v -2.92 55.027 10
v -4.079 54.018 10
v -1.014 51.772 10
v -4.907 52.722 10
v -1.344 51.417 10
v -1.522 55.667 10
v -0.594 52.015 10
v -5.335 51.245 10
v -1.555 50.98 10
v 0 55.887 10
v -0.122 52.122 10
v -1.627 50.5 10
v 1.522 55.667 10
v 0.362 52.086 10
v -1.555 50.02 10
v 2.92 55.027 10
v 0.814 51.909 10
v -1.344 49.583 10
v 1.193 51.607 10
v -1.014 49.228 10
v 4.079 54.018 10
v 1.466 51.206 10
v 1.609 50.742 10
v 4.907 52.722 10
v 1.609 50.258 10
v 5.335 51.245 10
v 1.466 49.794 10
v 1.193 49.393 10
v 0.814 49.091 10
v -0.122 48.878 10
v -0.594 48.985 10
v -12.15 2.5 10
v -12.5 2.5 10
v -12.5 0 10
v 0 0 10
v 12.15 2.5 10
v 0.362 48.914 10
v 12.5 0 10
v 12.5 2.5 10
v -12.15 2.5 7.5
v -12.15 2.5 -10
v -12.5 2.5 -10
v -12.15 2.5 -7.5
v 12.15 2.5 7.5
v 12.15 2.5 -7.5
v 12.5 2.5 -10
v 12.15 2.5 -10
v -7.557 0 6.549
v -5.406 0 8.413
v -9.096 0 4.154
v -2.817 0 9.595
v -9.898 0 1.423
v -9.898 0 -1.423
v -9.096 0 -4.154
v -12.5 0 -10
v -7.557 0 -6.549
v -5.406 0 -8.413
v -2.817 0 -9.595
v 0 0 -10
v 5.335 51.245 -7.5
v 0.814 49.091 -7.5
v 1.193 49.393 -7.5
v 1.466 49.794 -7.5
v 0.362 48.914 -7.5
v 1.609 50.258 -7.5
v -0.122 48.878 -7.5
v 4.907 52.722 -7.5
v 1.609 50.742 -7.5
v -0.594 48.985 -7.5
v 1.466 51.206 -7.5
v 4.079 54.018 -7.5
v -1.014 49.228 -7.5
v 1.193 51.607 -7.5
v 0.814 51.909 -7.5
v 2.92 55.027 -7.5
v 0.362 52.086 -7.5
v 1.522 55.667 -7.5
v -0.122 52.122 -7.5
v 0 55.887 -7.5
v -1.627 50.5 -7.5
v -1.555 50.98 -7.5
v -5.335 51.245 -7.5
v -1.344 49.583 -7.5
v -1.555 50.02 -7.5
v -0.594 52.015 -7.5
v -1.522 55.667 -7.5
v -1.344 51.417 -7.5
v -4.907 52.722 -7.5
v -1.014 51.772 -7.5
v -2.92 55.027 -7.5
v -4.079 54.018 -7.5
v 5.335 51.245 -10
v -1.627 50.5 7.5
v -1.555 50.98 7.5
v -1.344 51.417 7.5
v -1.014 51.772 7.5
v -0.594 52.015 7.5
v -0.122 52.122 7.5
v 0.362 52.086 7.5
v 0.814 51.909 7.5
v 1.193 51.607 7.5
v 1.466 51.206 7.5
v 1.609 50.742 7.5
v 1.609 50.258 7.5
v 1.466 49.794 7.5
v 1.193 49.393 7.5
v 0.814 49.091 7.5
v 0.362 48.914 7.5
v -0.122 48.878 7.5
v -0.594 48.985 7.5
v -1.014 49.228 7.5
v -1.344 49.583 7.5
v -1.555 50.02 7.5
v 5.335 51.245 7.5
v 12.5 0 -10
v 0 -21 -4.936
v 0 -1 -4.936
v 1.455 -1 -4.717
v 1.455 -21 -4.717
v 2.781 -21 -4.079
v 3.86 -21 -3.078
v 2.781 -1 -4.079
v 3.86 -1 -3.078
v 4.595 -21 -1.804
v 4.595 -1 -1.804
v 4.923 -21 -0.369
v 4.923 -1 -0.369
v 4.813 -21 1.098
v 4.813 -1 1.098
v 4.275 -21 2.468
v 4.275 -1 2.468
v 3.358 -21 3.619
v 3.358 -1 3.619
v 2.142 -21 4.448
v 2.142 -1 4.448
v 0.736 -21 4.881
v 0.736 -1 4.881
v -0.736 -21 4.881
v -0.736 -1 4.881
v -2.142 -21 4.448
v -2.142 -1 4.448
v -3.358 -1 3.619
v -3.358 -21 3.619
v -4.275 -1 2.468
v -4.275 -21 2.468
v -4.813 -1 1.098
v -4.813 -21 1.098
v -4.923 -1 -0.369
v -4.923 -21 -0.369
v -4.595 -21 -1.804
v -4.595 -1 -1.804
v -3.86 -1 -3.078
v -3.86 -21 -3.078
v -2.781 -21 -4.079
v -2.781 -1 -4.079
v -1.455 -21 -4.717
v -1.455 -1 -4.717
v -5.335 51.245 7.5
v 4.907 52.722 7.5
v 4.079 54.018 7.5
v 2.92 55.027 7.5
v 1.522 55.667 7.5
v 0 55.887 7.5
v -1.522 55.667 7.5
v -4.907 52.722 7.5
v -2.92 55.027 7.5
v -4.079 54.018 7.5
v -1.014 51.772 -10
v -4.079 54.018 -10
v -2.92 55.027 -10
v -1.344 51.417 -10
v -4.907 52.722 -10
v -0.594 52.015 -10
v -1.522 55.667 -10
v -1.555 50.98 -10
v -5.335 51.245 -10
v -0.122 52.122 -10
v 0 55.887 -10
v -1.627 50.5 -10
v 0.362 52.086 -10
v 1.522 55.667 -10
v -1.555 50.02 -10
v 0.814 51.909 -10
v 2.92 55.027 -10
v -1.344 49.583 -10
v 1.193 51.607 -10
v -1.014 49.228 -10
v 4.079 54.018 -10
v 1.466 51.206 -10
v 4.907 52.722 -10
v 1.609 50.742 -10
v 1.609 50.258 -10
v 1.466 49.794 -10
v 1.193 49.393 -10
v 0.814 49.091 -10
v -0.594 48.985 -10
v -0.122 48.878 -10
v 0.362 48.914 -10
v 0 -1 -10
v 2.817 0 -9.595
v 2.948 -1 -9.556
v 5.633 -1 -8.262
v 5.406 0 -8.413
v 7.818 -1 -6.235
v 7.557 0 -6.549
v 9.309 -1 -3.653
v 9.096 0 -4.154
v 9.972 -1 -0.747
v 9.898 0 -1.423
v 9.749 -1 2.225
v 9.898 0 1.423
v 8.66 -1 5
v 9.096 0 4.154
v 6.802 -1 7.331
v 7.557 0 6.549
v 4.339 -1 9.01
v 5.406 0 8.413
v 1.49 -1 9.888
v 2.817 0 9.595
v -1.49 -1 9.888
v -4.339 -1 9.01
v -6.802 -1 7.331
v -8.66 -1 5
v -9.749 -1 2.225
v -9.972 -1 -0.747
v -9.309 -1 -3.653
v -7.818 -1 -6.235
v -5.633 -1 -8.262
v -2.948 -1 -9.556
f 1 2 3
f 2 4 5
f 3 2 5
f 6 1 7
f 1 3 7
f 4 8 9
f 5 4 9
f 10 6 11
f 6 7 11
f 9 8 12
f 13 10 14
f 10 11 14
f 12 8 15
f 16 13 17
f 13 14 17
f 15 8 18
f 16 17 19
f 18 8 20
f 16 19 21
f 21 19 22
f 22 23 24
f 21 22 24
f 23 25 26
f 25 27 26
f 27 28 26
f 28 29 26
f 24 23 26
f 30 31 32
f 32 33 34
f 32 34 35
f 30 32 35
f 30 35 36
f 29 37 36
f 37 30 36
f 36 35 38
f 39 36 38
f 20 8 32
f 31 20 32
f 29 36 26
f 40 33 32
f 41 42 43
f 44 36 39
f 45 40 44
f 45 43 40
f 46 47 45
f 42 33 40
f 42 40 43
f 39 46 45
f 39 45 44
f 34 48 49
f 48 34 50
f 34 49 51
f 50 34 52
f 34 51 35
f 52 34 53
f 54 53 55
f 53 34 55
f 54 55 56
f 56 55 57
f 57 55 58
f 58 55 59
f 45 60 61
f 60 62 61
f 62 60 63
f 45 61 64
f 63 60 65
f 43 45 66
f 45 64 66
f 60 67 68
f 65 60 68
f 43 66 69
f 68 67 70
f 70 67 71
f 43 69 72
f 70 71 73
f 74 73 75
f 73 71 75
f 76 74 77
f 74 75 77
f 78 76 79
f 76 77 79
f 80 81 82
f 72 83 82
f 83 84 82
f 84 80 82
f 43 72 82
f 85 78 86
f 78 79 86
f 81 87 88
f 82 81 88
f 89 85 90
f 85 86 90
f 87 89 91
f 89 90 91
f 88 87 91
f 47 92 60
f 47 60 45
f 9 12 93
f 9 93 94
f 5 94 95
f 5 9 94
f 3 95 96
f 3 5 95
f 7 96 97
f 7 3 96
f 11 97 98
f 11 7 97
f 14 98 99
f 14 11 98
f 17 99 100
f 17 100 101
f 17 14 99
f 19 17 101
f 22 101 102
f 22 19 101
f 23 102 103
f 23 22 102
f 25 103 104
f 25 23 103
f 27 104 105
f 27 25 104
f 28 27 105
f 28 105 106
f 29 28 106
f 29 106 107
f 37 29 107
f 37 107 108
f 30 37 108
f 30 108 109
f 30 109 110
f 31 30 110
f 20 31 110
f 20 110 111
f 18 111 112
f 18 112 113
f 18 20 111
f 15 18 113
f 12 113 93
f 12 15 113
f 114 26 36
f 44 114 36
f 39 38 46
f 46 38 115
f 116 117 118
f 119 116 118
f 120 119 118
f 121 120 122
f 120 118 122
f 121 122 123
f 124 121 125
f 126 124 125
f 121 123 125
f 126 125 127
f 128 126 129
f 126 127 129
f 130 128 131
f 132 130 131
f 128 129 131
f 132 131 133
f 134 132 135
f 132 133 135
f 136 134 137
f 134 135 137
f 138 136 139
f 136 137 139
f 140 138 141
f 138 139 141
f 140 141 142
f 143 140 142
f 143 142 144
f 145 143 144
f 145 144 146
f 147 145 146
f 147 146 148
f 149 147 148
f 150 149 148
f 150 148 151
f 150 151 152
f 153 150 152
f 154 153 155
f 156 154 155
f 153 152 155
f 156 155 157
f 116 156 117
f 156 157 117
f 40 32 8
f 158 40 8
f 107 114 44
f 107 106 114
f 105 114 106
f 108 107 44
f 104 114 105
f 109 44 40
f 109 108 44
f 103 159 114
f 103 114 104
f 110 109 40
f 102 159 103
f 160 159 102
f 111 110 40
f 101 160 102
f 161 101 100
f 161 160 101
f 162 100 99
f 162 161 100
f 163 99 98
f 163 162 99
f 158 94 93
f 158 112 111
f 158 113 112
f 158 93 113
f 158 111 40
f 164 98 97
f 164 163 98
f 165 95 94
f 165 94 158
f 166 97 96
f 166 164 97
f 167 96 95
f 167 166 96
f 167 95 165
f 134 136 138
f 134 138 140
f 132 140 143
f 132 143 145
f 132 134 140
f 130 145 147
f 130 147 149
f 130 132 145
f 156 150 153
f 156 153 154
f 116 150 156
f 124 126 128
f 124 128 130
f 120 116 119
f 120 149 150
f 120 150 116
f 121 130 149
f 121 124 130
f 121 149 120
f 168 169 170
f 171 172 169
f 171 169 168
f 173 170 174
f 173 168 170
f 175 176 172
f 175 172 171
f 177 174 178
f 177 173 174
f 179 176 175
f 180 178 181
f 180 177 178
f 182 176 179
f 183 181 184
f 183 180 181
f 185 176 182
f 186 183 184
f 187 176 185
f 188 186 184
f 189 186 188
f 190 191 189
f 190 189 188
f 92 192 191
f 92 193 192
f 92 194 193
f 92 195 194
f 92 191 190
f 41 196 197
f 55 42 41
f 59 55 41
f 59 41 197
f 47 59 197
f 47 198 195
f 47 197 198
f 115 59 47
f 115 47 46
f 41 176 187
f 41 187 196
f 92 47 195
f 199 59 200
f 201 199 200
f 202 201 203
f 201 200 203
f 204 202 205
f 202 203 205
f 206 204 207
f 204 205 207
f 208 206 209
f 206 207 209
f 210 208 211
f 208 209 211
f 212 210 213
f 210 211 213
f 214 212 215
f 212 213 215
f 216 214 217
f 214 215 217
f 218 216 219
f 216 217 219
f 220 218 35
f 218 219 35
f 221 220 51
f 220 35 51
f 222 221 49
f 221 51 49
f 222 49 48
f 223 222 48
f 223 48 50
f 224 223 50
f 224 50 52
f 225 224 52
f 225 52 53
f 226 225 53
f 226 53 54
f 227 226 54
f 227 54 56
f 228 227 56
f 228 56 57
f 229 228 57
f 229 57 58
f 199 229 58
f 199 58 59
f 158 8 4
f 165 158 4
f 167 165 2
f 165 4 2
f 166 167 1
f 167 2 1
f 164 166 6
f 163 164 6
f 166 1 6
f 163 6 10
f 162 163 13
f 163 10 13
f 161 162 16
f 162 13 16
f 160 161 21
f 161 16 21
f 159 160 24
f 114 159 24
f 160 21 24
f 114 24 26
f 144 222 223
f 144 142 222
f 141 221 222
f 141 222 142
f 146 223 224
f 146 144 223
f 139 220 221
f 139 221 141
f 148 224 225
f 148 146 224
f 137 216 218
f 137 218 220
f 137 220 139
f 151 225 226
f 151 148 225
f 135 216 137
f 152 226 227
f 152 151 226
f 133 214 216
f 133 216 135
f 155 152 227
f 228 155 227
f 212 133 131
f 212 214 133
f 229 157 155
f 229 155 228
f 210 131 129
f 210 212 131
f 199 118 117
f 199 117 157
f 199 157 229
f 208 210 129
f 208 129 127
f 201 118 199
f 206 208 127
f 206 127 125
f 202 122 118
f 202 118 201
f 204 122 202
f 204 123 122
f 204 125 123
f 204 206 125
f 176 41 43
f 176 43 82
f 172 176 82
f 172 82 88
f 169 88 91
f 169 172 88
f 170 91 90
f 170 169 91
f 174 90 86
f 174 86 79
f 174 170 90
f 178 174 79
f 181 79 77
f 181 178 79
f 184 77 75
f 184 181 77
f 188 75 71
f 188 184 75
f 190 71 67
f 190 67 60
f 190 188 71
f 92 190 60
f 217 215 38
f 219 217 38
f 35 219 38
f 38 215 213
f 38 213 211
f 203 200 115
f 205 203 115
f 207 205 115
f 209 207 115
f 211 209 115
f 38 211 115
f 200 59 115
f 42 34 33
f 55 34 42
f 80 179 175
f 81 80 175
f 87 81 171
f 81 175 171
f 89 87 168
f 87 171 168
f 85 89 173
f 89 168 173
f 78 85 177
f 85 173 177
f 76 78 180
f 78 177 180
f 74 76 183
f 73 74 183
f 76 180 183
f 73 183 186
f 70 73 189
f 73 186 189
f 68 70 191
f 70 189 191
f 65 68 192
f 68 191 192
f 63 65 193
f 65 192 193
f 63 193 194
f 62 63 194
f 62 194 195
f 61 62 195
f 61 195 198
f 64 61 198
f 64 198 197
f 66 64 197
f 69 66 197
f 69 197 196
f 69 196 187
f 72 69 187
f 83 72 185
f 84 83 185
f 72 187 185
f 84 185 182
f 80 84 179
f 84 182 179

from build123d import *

# Parameters (mm, degrees)
SKETCH1_W           = 25
SKETCH1_H           = 20
BOSS_EXTRUDE1_DEPTH = 2.5
SKETCH4_R           = 10
BOSS_EXTRUDE3_DEPTH = 1
SKETCH5_R           = 4.9365
BOSS_EXTRUDE4_DEPTH = 20
SKETCH6_R           = 1.627
BOSS_EXTRUDE5_DEPTH = 2.5


with BuildPart() as part:
    # Sketch1 → Boss-Extrude1 (new body)
    with BuildSketch(Plane(origin=(0, 0, 0), x_dir=(1, 0, 0), z_dir=(0, 1, 0))):
        Rectangle(SKETCH1_W, SKETCH1_H)
    extrude(amount=BOSS_EXTRUDE1_DEPTH)

    # Sketch4 → Boss-Extrude3 (add)
    with BuildSketch(Plane.XZ):
        with Locations(Location((0, 0, 0), (0, 0, 270))):
            Circle(SKETCH4_R)
    extrude(amount=BOSS_EXTRUDE3_DEPTH)

    # Sketch5 → Boss-Extrude4 (add)
    with BuildSketch(Plane.XZ.offset(1)):
        with Locations(Location((0, 0, 0), (0, 0, 270))):
            Circle(SKETCH5_R)
    extrude(amount=BOSS_EXTRUDE4_DEPTH)

    # Sketch6 → Boss-Extrude5 (add)
    with BuildSketch(Plane(origin=(0, 0, -10), x_dir=(-1, 0, 0), z_dir=(0, 0, -1))):
        with BuildLine():
            Line((-12.150452519, 2.5), (12.150452519, 2.5))
            Line((12.150452519, 2.5), (5.334920531, 51.245394823))
            ThreePointArc((5.334920531, 51.245394823), (0, 55.886742106), (-5.334920531, 51.245394823))
            Line((-5.334920531, 51.245394823), (-12.150452519, 2.5))
        make_face()
        with Locations((0, 50.5)):
            Circle(SKETCH6_R, mode=Mode.SUBTRACT)
    boss_extrude5 = extrude(amount=-BOSS_EXTRUDE5_DEPTH)

    # Mirror2: Boss-Extrude5 across plane
    add(boss_extrude5.mirror(Plane(origin=(0, 0, 0), x_dir=(1, 0, 0), z_dir=(0, 0, -1))))


solid = part.part
